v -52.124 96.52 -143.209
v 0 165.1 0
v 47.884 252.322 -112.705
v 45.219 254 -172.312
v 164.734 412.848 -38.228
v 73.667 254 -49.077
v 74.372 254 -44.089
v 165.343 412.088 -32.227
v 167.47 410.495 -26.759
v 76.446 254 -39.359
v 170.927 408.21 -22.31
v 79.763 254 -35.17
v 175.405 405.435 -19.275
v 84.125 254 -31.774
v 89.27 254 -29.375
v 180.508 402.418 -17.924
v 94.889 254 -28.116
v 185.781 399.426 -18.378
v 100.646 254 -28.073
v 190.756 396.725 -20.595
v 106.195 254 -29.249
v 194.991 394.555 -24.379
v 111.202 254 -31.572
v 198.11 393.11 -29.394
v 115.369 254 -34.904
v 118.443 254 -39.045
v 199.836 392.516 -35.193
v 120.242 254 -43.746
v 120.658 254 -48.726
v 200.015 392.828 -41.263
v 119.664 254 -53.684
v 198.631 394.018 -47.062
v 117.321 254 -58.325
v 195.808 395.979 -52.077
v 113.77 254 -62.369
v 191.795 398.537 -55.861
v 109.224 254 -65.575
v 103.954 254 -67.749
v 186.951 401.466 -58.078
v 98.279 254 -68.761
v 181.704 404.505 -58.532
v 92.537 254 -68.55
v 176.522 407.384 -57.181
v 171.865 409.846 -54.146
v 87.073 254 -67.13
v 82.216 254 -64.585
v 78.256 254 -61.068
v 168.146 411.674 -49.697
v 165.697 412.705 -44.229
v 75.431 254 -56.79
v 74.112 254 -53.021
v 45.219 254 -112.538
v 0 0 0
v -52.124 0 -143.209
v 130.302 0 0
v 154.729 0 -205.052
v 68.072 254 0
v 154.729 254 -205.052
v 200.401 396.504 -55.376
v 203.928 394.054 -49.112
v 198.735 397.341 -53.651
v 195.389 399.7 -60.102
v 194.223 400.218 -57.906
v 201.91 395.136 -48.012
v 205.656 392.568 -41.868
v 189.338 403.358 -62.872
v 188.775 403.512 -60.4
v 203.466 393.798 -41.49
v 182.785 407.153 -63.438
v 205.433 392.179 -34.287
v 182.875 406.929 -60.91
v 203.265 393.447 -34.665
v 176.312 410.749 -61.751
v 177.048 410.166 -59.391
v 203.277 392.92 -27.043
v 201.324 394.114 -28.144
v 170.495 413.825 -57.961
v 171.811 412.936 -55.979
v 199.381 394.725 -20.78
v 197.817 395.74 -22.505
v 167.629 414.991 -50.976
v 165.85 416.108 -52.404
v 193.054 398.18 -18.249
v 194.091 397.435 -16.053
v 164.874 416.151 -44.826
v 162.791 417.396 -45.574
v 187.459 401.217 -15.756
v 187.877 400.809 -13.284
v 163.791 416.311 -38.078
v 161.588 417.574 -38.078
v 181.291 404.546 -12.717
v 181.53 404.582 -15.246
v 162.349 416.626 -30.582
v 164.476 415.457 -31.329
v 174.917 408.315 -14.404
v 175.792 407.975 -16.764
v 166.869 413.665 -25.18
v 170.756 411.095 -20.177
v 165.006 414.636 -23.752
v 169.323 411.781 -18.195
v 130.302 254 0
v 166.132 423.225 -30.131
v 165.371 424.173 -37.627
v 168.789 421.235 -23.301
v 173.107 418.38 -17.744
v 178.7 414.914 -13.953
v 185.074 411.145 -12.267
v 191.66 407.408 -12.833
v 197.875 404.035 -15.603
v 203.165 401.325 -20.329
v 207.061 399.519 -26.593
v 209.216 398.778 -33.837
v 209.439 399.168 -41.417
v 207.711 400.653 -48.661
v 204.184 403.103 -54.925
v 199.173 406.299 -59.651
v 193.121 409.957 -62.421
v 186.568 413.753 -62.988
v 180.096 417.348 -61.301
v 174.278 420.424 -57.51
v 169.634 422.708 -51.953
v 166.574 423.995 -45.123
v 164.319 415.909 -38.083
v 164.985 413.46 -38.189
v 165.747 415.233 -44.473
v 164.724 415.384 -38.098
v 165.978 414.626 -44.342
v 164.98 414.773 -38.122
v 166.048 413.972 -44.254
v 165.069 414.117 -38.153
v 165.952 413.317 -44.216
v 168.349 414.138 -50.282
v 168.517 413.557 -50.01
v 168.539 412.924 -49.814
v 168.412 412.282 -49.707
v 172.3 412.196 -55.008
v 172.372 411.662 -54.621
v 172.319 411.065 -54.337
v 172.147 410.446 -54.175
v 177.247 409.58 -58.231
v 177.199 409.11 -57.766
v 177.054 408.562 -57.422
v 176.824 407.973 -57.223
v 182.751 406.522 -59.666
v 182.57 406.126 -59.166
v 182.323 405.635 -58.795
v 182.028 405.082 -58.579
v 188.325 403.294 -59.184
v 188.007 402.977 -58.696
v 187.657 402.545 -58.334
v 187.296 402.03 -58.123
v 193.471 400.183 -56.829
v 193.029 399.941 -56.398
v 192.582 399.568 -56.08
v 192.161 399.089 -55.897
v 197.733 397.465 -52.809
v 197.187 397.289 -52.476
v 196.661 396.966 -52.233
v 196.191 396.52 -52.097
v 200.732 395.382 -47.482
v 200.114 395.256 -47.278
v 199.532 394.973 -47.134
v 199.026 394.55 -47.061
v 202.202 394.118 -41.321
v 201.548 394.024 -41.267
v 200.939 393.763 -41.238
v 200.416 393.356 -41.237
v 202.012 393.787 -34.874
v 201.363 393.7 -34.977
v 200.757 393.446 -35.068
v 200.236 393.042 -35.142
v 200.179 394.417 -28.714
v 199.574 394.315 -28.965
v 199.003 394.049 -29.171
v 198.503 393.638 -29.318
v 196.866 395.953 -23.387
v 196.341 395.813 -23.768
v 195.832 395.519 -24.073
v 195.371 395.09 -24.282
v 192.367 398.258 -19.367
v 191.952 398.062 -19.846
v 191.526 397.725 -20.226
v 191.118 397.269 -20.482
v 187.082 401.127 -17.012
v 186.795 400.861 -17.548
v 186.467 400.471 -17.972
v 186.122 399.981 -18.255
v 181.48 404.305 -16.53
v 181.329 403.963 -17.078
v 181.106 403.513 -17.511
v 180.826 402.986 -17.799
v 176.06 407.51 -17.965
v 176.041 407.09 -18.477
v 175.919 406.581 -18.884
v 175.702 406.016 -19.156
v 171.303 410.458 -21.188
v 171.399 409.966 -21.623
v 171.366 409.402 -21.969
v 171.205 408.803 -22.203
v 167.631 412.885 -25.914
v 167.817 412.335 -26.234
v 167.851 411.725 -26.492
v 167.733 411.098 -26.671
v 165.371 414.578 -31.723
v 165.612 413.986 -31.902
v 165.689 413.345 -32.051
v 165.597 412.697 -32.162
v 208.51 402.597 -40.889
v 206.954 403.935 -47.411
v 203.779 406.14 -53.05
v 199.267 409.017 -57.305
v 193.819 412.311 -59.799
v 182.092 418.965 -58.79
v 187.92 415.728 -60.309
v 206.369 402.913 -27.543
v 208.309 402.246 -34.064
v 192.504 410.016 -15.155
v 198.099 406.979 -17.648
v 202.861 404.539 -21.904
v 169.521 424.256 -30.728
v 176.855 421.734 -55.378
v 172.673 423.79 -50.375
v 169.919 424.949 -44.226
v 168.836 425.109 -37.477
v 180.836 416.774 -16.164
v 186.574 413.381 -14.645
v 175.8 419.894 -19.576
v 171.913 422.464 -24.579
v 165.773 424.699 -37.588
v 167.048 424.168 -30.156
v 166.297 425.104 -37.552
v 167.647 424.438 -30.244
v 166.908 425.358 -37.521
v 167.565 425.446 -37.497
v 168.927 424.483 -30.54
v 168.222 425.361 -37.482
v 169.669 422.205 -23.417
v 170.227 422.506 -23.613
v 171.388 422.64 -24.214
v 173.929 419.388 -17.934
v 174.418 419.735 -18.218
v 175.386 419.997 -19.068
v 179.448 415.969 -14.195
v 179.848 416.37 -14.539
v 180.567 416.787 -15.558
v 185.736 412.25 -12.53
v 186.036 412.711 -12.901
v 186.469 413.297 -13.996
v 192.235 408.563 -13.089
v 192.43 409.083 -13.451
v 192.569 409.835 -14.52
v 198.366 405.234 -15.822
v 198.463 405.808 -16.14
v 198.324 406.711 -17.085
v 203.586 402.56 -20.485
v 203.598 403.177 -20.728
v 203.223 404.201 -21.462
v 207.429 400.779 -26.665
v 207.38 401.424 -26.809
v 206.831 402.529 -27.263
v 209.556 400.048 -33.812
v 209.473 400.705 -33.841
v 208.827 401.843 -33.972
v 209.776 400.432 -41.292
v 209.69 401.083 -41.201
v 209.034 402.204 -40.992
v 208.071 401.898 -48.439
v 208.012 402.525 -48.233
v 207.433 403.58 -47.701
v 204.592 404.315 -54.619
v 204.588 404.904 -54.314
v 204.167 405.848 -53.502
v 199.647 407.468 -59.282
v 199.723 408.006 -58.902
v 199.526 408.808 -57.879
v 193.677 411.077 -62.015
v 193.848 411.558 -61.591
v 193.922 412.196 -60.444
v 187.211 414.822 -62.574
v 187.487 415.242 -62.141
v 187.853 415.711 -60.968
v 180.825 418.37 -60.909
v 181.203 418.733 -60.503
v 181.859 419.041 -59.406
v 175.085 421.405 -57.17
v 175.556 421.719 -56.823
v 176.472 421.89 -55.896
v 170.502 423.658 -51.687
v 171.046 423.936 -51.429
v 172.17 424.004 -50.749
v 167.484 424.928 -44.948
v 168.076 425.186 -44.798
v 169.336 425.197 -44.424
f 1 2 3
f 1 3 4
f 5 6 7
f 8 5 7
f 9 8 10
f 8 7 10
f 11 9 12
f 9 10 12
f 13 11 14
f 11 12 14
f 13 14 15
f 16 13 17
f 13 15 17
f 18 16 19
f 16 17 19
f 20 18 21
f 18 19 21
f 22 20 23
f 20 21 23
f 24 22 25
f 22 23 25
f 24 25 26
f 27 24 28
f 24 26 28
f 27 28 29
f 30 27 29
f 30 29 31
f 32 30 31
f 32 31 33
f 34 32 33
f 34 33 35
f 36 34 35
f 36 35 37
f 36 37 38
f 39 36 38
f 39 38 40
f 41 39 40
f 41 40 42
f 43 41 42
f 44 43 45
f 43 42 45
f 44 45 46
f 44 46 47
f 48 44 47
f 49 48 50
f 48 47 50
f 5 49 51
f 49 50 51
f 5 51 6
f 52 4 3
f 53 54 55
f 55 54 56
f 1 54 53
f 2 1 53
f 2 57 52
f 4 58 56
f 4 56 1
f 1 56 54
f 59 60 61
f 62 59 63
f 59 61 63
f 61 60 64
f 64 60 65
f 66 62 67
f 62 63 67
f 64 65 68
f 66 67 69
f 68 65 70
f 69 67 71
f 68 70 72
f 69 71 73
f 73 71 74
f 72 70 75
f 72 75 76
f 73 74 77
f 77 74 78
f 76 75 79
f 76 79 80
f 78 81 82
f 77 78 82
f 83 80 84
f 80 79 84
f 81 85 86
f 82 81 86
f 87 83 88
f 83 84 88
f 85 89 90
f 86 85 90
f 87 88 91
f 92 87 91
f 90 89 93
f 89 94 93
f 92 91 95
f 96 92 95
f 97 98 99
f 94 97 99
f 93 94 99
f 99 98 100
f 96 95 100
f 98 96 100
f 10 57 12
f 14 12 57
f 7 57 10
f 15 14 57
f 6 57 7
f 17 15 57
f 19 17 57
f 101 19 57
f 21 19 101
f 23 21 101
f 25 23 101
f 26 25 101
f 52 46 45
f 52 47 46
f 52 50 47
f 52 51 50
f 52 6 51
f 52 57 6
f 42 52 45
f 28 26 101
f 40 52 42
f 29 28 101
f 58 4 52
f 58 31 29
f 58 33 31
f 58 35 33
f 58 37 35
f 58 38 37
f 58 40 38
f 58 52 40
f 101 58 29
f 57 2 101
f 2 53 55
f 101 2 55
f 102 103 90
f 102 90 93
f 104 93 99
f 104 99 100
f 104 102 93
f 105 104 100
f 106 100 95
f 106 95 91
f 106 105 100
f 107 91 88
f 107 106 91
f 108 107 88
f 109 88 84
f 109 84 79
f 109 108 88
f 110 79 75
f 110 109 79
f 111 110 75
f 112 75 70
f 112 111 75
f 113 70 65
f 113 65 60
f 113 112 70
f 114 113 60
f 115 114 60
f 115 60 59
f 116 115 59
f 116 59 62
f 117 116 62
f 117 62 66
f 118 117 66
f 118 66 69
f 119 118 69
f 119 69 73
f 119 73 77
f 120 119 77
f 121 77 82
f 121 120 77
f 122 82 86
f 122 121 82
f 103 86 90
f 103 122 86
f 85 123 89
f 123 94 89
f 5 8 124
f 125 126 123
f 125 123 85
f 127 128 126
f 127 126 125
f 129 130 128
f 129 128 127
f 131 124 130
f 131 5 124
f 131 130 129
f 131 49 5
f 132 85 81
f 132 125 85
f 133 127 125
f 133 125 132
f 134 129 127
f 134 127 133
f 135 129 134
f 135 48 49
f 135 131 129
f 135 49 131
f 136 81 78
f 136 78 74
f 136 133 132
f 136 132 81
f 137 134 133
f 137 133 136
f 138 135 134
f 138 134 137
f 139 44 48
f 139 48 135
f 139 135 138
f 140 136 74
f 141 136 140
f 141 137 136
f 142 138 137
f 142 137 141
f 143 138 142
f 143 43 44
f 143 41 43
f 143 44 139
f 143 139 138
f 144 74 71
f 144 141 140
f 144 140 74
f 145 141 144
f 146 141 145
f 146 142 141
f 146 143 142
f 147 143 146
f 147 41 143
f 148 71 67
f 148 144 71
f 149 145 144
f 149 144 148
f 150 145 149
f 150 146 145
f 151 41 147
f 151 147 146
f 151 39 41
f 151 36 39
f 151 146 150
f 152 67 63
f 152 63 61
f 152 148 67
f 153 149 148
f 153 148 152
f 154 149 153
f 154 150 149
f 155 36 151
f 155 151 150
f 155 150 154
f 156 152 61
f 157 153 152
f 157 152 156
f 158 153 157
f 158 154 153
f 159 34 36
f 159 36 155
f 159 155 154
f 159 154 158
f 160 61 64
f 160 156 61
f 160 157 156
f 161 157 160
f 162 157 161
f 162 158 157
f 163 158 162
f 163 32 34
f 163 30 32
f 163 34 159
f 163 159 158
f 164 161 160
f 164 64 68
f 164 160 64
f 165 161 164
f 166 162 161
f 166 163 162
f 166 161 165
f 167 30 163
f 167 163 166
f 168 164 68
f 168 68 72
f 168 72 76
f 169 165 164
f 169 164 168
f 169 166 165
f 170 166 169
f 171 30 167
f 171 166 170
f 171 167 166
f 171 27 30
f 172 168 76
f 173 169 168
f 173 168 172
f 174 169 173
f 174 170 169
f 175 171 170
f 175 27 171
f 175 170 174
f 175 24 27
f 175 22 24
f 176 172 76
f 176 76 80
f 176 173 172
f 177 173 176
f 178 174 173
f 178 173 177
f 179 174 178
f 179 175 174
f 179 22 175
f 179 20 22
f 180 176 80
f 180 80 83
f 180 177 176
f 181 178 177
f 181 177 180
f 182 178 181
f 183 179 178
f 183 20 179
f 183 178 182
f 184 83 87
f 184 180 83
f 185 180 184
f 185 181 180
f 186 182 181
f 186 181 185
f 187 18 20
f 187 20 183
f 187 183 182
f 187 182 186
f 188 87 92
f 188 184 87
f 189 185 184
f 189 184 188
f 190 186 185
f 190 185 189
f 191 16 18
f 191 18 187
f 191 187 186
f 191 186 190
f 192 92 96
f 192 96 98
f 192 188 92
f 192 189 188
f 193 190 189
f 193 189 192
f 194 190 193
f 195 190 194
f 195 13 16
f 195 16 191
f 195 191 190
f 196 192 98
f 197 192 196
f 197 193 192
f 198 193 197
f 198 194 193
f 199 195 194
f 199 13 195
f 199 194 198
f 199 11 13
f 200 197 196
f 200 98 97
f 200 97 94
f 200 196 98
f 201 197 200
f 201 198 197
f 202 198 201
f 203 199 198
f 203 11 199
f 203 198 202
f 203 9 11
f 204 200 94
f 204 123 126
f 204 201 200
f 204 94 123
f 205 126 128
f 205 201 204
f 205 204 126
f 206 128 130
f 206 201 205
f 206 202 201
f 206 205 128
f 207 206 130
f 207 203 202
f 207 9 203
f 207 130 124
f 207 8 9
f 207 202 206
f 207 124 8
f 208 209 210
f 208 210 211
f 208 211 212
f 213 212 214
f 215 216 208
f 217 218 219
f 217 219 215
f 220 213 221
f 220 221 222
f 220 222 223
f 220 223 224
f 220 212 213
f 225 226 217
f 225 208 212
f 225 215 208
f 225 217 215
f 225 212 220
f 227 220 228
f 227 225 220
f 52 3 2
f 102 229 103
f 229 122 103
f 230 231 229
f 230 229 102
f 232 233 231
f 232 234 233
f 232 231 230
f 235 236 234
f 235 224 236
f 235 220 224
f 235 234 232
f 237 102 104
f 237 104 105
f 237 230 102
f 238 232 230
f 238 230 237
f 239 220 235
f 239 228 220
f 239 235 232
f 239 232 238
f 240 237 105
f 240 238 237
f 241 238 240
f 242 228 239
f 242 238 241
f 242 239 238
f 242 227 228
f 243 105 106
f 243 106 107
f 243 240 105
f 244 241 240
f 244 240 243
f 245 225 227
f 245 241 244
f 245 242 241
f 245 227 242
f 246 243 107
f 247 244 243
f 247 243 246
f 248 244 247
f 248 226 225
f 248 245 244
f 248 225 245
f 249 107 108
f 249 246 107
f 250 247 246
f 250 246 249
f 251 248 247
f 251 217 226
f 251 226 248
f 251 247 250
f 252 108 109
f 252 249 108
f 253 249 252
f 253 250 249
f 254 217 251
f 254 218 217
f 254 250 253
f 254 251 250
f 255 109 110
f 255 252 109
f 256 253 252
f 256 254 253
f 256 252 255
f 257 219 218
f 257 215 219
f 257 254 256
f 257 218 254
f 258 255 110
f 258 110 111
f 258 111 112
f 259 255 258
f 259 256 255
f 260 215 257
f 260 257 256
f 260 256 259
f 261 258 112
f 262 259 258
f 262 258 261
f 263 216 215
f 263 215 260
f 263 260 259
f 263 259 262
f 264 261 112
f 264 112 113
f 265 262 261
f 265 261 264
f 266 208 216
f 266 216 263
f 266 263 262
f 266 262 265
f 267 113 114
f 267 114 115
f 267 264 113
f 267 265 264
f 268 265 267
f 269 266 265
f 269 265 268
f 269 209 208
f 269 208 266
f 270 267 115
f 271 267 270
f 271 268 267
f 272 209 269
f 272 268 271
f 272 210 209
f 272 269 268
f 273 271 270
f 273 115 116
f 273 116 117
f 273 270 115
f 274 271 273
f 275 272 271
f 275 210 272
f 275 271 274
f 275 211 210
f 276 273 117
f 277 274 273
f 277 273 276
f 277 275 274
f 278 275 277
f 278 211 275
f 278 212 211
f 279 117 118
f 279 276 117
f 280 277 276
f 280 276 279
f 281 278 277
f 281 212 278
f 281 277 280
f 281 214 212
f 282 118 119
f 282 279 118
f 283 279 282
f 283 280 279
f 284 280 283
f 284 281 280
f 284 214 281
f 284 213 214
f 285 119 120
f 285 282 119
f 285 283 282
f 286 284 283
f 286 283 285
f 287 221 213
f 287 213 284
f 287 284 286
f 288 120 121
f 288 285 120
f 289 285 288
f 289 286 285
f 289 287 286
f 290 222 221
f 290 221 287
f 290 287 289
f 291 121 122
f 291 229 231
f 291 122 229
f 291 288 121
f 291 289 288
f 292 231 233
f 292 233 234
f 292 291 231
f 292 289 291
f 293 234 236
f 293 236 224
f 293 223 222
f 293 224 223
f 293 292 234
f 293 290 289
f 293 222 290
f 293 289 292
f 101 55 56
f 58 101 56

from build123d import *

# Parameters (mm, degrees)
BOSS_EXTRUDE1_DEPTH      = 254
BOSS_EXTRUDE2_DEPTH      = 165.1
BOSS_EXTRUDE2_DEPTH_BACK = 50.8
SKETCH16_R               = 20.3962
SKETCH17_R               = 25.4762
BOSS_EXTRUDE3_DEPTH      = 10.16
FILLET1_R                = 2.54
CUT_EXTRUDE5_DEPTH       = 518.859576594
CUT_EXTRUDE14_DEPTH      = 516.224718622
CUT_EXTRUDE16_DEPTH      = 488.341428789


with BuildPart() as part:
    # Sketch2 → Boss-Extrude1 (new body)
    with BuildSketch(Plane(origin=(0, 0, 0), x_dir=(1, 0, 0), z_dir=(0, 1, 0))):
        Polygon((0, 0), (130.302, 0), (154.729351402, 205.052140948), (-52.123869843, 143.209155408), align=None)
    extrude(amount=BOSS_EXTRUDE1_DEPTH)

    # Sketch16 → Boss-Extrude2 (add, two sides: drawn at the far end of the back side and taken through both)
    with BuildSketch(Plane(origin=(141.332693429, 246.526276938, 16.836612147), x_dir=(0.11829111292954252, 0, -0.9929789587911166), z_dir=(0.4964894793955593, 0.8660254037844382, 0.059145556464771376)).offset(-BOSS_EXTRUDE2_DEPTH_BACK)):
        with Locations(Location((59.539258978, 48.389402794, 0), (0, 0, 95.890220986))):
            Circle(SKETCH16_R)
    extrude(amount=BOSS_EXTRUDE2_DEPTH + BOSS_EXTRUDE2_DEPTH_BACK)

    # Sketch17 → Boss-Extrude3 (add)
    with BuildSketch(Plane(origin=(223.303106477, 389.507071103, 26.601543519), x_dir=(0.8680427390684899, -0.49533563558134813, -0.0338291482851031), z_dir=(0.49648947939555943, 0.866025403784438, 0.0591455564647714))):
        with Locations(Location((-39.824375463, 65.578020566, 0), (0, 0, 178.057961601))):
            Circle(SKETCH17_R)
    extrude(amount=-BOSS_EXTRUDE3_DEPTH)

    # Fillet1
    fillet1_edges = [part.edges().sort_by_distance(p)[0] for p in [
        (201.384117467, 394.758696828, -38.077767579),
        (210.835574876, 401.03092525, -37.476848726),
    ]]
    fillet(fillet1_edges, radius=FILLET1_R)

    # Sketch37 → Cut-Extrude5 (cut, through all)
    with BuildSketch(Plane(origin=(-74.235573647, 46.74358774, 4.634969946), x_dir=(0.044647299319108304, -0.028112868945999136, 0.9986071726475507), z_dir=(-0.8450404746161061, 0.5320929256471292, 0.052760920546034554))):
        Polygon((-177.193506747, 239.03382897), (-117.503506747, 239.03382897), (-4.641434663, 139.710775348), (-148.050333908, 53.903642677), align=None)
    extrude(amount=CUT_EXTRUDE5_DEPTH, mode=Mode.SUBTRACT)

    # Sketch44 → Cut-Extrude14 (cut, through all)
    with BuildSketch(Plane(origin=(-77.674407605, 59.476403537, 15.773333495), x_dir=(-0.1263811849383747, 0.0967718787528128, -0.9872502213604327), z_dir=(0.7838483769002791, -0.6002039000265006, -0.1591760045477231))):
        Polygon((129.968891102, 229.15973728), (15.977037182, 243.05344524), (15.977037182, 131.08466752), align=None)
    extrude(amount=-CUT_EXTRUDE14_DEPTH, mode=Mode.SUBTRACT)


with BuildPart() as cut_extrude14_piece_1:
    # of the separate pieces the step leaves, piece 1, a body of its own (cut_extrude14_pieces)
    add(part.part.solids().sort_by_distance((164.733826071, 412.847507441, -38.227997293))[0])


with BuildPart() as cut_extrude14_piece_2:
    # of the separate pieces the step leaves, piece 2, a body of its own (cut_extrude14_pieces)
    add(part.part.solids().sort_by_distance((-24.451989708, 254, -67.181289582))[0])

    # Sketch54 → Cut-Extrude16 (cut, through all)
    with BuildSketch(Plane(origin=(48.324107263, 47.921039084, 57.272316376), x_dir=(0.8395487608428681, -0.34863488518909047, -0.4166672473286021), z_dir=(0.5432843437530708, 0.5387528450113599, 0.6438846898513436))):
        Polygon((-57.559619545, 126.622022749), (-3.698754498, 267.020987435), (-89.385563224, 299.892779983), (-143.246428271, 159.493815297), align=None)
    extrude(amount=-CUT_EXTRUDE16_DEPTH, mode=Mode.SUBTRACT)


solid = cut_extrude14_piece_1.part
